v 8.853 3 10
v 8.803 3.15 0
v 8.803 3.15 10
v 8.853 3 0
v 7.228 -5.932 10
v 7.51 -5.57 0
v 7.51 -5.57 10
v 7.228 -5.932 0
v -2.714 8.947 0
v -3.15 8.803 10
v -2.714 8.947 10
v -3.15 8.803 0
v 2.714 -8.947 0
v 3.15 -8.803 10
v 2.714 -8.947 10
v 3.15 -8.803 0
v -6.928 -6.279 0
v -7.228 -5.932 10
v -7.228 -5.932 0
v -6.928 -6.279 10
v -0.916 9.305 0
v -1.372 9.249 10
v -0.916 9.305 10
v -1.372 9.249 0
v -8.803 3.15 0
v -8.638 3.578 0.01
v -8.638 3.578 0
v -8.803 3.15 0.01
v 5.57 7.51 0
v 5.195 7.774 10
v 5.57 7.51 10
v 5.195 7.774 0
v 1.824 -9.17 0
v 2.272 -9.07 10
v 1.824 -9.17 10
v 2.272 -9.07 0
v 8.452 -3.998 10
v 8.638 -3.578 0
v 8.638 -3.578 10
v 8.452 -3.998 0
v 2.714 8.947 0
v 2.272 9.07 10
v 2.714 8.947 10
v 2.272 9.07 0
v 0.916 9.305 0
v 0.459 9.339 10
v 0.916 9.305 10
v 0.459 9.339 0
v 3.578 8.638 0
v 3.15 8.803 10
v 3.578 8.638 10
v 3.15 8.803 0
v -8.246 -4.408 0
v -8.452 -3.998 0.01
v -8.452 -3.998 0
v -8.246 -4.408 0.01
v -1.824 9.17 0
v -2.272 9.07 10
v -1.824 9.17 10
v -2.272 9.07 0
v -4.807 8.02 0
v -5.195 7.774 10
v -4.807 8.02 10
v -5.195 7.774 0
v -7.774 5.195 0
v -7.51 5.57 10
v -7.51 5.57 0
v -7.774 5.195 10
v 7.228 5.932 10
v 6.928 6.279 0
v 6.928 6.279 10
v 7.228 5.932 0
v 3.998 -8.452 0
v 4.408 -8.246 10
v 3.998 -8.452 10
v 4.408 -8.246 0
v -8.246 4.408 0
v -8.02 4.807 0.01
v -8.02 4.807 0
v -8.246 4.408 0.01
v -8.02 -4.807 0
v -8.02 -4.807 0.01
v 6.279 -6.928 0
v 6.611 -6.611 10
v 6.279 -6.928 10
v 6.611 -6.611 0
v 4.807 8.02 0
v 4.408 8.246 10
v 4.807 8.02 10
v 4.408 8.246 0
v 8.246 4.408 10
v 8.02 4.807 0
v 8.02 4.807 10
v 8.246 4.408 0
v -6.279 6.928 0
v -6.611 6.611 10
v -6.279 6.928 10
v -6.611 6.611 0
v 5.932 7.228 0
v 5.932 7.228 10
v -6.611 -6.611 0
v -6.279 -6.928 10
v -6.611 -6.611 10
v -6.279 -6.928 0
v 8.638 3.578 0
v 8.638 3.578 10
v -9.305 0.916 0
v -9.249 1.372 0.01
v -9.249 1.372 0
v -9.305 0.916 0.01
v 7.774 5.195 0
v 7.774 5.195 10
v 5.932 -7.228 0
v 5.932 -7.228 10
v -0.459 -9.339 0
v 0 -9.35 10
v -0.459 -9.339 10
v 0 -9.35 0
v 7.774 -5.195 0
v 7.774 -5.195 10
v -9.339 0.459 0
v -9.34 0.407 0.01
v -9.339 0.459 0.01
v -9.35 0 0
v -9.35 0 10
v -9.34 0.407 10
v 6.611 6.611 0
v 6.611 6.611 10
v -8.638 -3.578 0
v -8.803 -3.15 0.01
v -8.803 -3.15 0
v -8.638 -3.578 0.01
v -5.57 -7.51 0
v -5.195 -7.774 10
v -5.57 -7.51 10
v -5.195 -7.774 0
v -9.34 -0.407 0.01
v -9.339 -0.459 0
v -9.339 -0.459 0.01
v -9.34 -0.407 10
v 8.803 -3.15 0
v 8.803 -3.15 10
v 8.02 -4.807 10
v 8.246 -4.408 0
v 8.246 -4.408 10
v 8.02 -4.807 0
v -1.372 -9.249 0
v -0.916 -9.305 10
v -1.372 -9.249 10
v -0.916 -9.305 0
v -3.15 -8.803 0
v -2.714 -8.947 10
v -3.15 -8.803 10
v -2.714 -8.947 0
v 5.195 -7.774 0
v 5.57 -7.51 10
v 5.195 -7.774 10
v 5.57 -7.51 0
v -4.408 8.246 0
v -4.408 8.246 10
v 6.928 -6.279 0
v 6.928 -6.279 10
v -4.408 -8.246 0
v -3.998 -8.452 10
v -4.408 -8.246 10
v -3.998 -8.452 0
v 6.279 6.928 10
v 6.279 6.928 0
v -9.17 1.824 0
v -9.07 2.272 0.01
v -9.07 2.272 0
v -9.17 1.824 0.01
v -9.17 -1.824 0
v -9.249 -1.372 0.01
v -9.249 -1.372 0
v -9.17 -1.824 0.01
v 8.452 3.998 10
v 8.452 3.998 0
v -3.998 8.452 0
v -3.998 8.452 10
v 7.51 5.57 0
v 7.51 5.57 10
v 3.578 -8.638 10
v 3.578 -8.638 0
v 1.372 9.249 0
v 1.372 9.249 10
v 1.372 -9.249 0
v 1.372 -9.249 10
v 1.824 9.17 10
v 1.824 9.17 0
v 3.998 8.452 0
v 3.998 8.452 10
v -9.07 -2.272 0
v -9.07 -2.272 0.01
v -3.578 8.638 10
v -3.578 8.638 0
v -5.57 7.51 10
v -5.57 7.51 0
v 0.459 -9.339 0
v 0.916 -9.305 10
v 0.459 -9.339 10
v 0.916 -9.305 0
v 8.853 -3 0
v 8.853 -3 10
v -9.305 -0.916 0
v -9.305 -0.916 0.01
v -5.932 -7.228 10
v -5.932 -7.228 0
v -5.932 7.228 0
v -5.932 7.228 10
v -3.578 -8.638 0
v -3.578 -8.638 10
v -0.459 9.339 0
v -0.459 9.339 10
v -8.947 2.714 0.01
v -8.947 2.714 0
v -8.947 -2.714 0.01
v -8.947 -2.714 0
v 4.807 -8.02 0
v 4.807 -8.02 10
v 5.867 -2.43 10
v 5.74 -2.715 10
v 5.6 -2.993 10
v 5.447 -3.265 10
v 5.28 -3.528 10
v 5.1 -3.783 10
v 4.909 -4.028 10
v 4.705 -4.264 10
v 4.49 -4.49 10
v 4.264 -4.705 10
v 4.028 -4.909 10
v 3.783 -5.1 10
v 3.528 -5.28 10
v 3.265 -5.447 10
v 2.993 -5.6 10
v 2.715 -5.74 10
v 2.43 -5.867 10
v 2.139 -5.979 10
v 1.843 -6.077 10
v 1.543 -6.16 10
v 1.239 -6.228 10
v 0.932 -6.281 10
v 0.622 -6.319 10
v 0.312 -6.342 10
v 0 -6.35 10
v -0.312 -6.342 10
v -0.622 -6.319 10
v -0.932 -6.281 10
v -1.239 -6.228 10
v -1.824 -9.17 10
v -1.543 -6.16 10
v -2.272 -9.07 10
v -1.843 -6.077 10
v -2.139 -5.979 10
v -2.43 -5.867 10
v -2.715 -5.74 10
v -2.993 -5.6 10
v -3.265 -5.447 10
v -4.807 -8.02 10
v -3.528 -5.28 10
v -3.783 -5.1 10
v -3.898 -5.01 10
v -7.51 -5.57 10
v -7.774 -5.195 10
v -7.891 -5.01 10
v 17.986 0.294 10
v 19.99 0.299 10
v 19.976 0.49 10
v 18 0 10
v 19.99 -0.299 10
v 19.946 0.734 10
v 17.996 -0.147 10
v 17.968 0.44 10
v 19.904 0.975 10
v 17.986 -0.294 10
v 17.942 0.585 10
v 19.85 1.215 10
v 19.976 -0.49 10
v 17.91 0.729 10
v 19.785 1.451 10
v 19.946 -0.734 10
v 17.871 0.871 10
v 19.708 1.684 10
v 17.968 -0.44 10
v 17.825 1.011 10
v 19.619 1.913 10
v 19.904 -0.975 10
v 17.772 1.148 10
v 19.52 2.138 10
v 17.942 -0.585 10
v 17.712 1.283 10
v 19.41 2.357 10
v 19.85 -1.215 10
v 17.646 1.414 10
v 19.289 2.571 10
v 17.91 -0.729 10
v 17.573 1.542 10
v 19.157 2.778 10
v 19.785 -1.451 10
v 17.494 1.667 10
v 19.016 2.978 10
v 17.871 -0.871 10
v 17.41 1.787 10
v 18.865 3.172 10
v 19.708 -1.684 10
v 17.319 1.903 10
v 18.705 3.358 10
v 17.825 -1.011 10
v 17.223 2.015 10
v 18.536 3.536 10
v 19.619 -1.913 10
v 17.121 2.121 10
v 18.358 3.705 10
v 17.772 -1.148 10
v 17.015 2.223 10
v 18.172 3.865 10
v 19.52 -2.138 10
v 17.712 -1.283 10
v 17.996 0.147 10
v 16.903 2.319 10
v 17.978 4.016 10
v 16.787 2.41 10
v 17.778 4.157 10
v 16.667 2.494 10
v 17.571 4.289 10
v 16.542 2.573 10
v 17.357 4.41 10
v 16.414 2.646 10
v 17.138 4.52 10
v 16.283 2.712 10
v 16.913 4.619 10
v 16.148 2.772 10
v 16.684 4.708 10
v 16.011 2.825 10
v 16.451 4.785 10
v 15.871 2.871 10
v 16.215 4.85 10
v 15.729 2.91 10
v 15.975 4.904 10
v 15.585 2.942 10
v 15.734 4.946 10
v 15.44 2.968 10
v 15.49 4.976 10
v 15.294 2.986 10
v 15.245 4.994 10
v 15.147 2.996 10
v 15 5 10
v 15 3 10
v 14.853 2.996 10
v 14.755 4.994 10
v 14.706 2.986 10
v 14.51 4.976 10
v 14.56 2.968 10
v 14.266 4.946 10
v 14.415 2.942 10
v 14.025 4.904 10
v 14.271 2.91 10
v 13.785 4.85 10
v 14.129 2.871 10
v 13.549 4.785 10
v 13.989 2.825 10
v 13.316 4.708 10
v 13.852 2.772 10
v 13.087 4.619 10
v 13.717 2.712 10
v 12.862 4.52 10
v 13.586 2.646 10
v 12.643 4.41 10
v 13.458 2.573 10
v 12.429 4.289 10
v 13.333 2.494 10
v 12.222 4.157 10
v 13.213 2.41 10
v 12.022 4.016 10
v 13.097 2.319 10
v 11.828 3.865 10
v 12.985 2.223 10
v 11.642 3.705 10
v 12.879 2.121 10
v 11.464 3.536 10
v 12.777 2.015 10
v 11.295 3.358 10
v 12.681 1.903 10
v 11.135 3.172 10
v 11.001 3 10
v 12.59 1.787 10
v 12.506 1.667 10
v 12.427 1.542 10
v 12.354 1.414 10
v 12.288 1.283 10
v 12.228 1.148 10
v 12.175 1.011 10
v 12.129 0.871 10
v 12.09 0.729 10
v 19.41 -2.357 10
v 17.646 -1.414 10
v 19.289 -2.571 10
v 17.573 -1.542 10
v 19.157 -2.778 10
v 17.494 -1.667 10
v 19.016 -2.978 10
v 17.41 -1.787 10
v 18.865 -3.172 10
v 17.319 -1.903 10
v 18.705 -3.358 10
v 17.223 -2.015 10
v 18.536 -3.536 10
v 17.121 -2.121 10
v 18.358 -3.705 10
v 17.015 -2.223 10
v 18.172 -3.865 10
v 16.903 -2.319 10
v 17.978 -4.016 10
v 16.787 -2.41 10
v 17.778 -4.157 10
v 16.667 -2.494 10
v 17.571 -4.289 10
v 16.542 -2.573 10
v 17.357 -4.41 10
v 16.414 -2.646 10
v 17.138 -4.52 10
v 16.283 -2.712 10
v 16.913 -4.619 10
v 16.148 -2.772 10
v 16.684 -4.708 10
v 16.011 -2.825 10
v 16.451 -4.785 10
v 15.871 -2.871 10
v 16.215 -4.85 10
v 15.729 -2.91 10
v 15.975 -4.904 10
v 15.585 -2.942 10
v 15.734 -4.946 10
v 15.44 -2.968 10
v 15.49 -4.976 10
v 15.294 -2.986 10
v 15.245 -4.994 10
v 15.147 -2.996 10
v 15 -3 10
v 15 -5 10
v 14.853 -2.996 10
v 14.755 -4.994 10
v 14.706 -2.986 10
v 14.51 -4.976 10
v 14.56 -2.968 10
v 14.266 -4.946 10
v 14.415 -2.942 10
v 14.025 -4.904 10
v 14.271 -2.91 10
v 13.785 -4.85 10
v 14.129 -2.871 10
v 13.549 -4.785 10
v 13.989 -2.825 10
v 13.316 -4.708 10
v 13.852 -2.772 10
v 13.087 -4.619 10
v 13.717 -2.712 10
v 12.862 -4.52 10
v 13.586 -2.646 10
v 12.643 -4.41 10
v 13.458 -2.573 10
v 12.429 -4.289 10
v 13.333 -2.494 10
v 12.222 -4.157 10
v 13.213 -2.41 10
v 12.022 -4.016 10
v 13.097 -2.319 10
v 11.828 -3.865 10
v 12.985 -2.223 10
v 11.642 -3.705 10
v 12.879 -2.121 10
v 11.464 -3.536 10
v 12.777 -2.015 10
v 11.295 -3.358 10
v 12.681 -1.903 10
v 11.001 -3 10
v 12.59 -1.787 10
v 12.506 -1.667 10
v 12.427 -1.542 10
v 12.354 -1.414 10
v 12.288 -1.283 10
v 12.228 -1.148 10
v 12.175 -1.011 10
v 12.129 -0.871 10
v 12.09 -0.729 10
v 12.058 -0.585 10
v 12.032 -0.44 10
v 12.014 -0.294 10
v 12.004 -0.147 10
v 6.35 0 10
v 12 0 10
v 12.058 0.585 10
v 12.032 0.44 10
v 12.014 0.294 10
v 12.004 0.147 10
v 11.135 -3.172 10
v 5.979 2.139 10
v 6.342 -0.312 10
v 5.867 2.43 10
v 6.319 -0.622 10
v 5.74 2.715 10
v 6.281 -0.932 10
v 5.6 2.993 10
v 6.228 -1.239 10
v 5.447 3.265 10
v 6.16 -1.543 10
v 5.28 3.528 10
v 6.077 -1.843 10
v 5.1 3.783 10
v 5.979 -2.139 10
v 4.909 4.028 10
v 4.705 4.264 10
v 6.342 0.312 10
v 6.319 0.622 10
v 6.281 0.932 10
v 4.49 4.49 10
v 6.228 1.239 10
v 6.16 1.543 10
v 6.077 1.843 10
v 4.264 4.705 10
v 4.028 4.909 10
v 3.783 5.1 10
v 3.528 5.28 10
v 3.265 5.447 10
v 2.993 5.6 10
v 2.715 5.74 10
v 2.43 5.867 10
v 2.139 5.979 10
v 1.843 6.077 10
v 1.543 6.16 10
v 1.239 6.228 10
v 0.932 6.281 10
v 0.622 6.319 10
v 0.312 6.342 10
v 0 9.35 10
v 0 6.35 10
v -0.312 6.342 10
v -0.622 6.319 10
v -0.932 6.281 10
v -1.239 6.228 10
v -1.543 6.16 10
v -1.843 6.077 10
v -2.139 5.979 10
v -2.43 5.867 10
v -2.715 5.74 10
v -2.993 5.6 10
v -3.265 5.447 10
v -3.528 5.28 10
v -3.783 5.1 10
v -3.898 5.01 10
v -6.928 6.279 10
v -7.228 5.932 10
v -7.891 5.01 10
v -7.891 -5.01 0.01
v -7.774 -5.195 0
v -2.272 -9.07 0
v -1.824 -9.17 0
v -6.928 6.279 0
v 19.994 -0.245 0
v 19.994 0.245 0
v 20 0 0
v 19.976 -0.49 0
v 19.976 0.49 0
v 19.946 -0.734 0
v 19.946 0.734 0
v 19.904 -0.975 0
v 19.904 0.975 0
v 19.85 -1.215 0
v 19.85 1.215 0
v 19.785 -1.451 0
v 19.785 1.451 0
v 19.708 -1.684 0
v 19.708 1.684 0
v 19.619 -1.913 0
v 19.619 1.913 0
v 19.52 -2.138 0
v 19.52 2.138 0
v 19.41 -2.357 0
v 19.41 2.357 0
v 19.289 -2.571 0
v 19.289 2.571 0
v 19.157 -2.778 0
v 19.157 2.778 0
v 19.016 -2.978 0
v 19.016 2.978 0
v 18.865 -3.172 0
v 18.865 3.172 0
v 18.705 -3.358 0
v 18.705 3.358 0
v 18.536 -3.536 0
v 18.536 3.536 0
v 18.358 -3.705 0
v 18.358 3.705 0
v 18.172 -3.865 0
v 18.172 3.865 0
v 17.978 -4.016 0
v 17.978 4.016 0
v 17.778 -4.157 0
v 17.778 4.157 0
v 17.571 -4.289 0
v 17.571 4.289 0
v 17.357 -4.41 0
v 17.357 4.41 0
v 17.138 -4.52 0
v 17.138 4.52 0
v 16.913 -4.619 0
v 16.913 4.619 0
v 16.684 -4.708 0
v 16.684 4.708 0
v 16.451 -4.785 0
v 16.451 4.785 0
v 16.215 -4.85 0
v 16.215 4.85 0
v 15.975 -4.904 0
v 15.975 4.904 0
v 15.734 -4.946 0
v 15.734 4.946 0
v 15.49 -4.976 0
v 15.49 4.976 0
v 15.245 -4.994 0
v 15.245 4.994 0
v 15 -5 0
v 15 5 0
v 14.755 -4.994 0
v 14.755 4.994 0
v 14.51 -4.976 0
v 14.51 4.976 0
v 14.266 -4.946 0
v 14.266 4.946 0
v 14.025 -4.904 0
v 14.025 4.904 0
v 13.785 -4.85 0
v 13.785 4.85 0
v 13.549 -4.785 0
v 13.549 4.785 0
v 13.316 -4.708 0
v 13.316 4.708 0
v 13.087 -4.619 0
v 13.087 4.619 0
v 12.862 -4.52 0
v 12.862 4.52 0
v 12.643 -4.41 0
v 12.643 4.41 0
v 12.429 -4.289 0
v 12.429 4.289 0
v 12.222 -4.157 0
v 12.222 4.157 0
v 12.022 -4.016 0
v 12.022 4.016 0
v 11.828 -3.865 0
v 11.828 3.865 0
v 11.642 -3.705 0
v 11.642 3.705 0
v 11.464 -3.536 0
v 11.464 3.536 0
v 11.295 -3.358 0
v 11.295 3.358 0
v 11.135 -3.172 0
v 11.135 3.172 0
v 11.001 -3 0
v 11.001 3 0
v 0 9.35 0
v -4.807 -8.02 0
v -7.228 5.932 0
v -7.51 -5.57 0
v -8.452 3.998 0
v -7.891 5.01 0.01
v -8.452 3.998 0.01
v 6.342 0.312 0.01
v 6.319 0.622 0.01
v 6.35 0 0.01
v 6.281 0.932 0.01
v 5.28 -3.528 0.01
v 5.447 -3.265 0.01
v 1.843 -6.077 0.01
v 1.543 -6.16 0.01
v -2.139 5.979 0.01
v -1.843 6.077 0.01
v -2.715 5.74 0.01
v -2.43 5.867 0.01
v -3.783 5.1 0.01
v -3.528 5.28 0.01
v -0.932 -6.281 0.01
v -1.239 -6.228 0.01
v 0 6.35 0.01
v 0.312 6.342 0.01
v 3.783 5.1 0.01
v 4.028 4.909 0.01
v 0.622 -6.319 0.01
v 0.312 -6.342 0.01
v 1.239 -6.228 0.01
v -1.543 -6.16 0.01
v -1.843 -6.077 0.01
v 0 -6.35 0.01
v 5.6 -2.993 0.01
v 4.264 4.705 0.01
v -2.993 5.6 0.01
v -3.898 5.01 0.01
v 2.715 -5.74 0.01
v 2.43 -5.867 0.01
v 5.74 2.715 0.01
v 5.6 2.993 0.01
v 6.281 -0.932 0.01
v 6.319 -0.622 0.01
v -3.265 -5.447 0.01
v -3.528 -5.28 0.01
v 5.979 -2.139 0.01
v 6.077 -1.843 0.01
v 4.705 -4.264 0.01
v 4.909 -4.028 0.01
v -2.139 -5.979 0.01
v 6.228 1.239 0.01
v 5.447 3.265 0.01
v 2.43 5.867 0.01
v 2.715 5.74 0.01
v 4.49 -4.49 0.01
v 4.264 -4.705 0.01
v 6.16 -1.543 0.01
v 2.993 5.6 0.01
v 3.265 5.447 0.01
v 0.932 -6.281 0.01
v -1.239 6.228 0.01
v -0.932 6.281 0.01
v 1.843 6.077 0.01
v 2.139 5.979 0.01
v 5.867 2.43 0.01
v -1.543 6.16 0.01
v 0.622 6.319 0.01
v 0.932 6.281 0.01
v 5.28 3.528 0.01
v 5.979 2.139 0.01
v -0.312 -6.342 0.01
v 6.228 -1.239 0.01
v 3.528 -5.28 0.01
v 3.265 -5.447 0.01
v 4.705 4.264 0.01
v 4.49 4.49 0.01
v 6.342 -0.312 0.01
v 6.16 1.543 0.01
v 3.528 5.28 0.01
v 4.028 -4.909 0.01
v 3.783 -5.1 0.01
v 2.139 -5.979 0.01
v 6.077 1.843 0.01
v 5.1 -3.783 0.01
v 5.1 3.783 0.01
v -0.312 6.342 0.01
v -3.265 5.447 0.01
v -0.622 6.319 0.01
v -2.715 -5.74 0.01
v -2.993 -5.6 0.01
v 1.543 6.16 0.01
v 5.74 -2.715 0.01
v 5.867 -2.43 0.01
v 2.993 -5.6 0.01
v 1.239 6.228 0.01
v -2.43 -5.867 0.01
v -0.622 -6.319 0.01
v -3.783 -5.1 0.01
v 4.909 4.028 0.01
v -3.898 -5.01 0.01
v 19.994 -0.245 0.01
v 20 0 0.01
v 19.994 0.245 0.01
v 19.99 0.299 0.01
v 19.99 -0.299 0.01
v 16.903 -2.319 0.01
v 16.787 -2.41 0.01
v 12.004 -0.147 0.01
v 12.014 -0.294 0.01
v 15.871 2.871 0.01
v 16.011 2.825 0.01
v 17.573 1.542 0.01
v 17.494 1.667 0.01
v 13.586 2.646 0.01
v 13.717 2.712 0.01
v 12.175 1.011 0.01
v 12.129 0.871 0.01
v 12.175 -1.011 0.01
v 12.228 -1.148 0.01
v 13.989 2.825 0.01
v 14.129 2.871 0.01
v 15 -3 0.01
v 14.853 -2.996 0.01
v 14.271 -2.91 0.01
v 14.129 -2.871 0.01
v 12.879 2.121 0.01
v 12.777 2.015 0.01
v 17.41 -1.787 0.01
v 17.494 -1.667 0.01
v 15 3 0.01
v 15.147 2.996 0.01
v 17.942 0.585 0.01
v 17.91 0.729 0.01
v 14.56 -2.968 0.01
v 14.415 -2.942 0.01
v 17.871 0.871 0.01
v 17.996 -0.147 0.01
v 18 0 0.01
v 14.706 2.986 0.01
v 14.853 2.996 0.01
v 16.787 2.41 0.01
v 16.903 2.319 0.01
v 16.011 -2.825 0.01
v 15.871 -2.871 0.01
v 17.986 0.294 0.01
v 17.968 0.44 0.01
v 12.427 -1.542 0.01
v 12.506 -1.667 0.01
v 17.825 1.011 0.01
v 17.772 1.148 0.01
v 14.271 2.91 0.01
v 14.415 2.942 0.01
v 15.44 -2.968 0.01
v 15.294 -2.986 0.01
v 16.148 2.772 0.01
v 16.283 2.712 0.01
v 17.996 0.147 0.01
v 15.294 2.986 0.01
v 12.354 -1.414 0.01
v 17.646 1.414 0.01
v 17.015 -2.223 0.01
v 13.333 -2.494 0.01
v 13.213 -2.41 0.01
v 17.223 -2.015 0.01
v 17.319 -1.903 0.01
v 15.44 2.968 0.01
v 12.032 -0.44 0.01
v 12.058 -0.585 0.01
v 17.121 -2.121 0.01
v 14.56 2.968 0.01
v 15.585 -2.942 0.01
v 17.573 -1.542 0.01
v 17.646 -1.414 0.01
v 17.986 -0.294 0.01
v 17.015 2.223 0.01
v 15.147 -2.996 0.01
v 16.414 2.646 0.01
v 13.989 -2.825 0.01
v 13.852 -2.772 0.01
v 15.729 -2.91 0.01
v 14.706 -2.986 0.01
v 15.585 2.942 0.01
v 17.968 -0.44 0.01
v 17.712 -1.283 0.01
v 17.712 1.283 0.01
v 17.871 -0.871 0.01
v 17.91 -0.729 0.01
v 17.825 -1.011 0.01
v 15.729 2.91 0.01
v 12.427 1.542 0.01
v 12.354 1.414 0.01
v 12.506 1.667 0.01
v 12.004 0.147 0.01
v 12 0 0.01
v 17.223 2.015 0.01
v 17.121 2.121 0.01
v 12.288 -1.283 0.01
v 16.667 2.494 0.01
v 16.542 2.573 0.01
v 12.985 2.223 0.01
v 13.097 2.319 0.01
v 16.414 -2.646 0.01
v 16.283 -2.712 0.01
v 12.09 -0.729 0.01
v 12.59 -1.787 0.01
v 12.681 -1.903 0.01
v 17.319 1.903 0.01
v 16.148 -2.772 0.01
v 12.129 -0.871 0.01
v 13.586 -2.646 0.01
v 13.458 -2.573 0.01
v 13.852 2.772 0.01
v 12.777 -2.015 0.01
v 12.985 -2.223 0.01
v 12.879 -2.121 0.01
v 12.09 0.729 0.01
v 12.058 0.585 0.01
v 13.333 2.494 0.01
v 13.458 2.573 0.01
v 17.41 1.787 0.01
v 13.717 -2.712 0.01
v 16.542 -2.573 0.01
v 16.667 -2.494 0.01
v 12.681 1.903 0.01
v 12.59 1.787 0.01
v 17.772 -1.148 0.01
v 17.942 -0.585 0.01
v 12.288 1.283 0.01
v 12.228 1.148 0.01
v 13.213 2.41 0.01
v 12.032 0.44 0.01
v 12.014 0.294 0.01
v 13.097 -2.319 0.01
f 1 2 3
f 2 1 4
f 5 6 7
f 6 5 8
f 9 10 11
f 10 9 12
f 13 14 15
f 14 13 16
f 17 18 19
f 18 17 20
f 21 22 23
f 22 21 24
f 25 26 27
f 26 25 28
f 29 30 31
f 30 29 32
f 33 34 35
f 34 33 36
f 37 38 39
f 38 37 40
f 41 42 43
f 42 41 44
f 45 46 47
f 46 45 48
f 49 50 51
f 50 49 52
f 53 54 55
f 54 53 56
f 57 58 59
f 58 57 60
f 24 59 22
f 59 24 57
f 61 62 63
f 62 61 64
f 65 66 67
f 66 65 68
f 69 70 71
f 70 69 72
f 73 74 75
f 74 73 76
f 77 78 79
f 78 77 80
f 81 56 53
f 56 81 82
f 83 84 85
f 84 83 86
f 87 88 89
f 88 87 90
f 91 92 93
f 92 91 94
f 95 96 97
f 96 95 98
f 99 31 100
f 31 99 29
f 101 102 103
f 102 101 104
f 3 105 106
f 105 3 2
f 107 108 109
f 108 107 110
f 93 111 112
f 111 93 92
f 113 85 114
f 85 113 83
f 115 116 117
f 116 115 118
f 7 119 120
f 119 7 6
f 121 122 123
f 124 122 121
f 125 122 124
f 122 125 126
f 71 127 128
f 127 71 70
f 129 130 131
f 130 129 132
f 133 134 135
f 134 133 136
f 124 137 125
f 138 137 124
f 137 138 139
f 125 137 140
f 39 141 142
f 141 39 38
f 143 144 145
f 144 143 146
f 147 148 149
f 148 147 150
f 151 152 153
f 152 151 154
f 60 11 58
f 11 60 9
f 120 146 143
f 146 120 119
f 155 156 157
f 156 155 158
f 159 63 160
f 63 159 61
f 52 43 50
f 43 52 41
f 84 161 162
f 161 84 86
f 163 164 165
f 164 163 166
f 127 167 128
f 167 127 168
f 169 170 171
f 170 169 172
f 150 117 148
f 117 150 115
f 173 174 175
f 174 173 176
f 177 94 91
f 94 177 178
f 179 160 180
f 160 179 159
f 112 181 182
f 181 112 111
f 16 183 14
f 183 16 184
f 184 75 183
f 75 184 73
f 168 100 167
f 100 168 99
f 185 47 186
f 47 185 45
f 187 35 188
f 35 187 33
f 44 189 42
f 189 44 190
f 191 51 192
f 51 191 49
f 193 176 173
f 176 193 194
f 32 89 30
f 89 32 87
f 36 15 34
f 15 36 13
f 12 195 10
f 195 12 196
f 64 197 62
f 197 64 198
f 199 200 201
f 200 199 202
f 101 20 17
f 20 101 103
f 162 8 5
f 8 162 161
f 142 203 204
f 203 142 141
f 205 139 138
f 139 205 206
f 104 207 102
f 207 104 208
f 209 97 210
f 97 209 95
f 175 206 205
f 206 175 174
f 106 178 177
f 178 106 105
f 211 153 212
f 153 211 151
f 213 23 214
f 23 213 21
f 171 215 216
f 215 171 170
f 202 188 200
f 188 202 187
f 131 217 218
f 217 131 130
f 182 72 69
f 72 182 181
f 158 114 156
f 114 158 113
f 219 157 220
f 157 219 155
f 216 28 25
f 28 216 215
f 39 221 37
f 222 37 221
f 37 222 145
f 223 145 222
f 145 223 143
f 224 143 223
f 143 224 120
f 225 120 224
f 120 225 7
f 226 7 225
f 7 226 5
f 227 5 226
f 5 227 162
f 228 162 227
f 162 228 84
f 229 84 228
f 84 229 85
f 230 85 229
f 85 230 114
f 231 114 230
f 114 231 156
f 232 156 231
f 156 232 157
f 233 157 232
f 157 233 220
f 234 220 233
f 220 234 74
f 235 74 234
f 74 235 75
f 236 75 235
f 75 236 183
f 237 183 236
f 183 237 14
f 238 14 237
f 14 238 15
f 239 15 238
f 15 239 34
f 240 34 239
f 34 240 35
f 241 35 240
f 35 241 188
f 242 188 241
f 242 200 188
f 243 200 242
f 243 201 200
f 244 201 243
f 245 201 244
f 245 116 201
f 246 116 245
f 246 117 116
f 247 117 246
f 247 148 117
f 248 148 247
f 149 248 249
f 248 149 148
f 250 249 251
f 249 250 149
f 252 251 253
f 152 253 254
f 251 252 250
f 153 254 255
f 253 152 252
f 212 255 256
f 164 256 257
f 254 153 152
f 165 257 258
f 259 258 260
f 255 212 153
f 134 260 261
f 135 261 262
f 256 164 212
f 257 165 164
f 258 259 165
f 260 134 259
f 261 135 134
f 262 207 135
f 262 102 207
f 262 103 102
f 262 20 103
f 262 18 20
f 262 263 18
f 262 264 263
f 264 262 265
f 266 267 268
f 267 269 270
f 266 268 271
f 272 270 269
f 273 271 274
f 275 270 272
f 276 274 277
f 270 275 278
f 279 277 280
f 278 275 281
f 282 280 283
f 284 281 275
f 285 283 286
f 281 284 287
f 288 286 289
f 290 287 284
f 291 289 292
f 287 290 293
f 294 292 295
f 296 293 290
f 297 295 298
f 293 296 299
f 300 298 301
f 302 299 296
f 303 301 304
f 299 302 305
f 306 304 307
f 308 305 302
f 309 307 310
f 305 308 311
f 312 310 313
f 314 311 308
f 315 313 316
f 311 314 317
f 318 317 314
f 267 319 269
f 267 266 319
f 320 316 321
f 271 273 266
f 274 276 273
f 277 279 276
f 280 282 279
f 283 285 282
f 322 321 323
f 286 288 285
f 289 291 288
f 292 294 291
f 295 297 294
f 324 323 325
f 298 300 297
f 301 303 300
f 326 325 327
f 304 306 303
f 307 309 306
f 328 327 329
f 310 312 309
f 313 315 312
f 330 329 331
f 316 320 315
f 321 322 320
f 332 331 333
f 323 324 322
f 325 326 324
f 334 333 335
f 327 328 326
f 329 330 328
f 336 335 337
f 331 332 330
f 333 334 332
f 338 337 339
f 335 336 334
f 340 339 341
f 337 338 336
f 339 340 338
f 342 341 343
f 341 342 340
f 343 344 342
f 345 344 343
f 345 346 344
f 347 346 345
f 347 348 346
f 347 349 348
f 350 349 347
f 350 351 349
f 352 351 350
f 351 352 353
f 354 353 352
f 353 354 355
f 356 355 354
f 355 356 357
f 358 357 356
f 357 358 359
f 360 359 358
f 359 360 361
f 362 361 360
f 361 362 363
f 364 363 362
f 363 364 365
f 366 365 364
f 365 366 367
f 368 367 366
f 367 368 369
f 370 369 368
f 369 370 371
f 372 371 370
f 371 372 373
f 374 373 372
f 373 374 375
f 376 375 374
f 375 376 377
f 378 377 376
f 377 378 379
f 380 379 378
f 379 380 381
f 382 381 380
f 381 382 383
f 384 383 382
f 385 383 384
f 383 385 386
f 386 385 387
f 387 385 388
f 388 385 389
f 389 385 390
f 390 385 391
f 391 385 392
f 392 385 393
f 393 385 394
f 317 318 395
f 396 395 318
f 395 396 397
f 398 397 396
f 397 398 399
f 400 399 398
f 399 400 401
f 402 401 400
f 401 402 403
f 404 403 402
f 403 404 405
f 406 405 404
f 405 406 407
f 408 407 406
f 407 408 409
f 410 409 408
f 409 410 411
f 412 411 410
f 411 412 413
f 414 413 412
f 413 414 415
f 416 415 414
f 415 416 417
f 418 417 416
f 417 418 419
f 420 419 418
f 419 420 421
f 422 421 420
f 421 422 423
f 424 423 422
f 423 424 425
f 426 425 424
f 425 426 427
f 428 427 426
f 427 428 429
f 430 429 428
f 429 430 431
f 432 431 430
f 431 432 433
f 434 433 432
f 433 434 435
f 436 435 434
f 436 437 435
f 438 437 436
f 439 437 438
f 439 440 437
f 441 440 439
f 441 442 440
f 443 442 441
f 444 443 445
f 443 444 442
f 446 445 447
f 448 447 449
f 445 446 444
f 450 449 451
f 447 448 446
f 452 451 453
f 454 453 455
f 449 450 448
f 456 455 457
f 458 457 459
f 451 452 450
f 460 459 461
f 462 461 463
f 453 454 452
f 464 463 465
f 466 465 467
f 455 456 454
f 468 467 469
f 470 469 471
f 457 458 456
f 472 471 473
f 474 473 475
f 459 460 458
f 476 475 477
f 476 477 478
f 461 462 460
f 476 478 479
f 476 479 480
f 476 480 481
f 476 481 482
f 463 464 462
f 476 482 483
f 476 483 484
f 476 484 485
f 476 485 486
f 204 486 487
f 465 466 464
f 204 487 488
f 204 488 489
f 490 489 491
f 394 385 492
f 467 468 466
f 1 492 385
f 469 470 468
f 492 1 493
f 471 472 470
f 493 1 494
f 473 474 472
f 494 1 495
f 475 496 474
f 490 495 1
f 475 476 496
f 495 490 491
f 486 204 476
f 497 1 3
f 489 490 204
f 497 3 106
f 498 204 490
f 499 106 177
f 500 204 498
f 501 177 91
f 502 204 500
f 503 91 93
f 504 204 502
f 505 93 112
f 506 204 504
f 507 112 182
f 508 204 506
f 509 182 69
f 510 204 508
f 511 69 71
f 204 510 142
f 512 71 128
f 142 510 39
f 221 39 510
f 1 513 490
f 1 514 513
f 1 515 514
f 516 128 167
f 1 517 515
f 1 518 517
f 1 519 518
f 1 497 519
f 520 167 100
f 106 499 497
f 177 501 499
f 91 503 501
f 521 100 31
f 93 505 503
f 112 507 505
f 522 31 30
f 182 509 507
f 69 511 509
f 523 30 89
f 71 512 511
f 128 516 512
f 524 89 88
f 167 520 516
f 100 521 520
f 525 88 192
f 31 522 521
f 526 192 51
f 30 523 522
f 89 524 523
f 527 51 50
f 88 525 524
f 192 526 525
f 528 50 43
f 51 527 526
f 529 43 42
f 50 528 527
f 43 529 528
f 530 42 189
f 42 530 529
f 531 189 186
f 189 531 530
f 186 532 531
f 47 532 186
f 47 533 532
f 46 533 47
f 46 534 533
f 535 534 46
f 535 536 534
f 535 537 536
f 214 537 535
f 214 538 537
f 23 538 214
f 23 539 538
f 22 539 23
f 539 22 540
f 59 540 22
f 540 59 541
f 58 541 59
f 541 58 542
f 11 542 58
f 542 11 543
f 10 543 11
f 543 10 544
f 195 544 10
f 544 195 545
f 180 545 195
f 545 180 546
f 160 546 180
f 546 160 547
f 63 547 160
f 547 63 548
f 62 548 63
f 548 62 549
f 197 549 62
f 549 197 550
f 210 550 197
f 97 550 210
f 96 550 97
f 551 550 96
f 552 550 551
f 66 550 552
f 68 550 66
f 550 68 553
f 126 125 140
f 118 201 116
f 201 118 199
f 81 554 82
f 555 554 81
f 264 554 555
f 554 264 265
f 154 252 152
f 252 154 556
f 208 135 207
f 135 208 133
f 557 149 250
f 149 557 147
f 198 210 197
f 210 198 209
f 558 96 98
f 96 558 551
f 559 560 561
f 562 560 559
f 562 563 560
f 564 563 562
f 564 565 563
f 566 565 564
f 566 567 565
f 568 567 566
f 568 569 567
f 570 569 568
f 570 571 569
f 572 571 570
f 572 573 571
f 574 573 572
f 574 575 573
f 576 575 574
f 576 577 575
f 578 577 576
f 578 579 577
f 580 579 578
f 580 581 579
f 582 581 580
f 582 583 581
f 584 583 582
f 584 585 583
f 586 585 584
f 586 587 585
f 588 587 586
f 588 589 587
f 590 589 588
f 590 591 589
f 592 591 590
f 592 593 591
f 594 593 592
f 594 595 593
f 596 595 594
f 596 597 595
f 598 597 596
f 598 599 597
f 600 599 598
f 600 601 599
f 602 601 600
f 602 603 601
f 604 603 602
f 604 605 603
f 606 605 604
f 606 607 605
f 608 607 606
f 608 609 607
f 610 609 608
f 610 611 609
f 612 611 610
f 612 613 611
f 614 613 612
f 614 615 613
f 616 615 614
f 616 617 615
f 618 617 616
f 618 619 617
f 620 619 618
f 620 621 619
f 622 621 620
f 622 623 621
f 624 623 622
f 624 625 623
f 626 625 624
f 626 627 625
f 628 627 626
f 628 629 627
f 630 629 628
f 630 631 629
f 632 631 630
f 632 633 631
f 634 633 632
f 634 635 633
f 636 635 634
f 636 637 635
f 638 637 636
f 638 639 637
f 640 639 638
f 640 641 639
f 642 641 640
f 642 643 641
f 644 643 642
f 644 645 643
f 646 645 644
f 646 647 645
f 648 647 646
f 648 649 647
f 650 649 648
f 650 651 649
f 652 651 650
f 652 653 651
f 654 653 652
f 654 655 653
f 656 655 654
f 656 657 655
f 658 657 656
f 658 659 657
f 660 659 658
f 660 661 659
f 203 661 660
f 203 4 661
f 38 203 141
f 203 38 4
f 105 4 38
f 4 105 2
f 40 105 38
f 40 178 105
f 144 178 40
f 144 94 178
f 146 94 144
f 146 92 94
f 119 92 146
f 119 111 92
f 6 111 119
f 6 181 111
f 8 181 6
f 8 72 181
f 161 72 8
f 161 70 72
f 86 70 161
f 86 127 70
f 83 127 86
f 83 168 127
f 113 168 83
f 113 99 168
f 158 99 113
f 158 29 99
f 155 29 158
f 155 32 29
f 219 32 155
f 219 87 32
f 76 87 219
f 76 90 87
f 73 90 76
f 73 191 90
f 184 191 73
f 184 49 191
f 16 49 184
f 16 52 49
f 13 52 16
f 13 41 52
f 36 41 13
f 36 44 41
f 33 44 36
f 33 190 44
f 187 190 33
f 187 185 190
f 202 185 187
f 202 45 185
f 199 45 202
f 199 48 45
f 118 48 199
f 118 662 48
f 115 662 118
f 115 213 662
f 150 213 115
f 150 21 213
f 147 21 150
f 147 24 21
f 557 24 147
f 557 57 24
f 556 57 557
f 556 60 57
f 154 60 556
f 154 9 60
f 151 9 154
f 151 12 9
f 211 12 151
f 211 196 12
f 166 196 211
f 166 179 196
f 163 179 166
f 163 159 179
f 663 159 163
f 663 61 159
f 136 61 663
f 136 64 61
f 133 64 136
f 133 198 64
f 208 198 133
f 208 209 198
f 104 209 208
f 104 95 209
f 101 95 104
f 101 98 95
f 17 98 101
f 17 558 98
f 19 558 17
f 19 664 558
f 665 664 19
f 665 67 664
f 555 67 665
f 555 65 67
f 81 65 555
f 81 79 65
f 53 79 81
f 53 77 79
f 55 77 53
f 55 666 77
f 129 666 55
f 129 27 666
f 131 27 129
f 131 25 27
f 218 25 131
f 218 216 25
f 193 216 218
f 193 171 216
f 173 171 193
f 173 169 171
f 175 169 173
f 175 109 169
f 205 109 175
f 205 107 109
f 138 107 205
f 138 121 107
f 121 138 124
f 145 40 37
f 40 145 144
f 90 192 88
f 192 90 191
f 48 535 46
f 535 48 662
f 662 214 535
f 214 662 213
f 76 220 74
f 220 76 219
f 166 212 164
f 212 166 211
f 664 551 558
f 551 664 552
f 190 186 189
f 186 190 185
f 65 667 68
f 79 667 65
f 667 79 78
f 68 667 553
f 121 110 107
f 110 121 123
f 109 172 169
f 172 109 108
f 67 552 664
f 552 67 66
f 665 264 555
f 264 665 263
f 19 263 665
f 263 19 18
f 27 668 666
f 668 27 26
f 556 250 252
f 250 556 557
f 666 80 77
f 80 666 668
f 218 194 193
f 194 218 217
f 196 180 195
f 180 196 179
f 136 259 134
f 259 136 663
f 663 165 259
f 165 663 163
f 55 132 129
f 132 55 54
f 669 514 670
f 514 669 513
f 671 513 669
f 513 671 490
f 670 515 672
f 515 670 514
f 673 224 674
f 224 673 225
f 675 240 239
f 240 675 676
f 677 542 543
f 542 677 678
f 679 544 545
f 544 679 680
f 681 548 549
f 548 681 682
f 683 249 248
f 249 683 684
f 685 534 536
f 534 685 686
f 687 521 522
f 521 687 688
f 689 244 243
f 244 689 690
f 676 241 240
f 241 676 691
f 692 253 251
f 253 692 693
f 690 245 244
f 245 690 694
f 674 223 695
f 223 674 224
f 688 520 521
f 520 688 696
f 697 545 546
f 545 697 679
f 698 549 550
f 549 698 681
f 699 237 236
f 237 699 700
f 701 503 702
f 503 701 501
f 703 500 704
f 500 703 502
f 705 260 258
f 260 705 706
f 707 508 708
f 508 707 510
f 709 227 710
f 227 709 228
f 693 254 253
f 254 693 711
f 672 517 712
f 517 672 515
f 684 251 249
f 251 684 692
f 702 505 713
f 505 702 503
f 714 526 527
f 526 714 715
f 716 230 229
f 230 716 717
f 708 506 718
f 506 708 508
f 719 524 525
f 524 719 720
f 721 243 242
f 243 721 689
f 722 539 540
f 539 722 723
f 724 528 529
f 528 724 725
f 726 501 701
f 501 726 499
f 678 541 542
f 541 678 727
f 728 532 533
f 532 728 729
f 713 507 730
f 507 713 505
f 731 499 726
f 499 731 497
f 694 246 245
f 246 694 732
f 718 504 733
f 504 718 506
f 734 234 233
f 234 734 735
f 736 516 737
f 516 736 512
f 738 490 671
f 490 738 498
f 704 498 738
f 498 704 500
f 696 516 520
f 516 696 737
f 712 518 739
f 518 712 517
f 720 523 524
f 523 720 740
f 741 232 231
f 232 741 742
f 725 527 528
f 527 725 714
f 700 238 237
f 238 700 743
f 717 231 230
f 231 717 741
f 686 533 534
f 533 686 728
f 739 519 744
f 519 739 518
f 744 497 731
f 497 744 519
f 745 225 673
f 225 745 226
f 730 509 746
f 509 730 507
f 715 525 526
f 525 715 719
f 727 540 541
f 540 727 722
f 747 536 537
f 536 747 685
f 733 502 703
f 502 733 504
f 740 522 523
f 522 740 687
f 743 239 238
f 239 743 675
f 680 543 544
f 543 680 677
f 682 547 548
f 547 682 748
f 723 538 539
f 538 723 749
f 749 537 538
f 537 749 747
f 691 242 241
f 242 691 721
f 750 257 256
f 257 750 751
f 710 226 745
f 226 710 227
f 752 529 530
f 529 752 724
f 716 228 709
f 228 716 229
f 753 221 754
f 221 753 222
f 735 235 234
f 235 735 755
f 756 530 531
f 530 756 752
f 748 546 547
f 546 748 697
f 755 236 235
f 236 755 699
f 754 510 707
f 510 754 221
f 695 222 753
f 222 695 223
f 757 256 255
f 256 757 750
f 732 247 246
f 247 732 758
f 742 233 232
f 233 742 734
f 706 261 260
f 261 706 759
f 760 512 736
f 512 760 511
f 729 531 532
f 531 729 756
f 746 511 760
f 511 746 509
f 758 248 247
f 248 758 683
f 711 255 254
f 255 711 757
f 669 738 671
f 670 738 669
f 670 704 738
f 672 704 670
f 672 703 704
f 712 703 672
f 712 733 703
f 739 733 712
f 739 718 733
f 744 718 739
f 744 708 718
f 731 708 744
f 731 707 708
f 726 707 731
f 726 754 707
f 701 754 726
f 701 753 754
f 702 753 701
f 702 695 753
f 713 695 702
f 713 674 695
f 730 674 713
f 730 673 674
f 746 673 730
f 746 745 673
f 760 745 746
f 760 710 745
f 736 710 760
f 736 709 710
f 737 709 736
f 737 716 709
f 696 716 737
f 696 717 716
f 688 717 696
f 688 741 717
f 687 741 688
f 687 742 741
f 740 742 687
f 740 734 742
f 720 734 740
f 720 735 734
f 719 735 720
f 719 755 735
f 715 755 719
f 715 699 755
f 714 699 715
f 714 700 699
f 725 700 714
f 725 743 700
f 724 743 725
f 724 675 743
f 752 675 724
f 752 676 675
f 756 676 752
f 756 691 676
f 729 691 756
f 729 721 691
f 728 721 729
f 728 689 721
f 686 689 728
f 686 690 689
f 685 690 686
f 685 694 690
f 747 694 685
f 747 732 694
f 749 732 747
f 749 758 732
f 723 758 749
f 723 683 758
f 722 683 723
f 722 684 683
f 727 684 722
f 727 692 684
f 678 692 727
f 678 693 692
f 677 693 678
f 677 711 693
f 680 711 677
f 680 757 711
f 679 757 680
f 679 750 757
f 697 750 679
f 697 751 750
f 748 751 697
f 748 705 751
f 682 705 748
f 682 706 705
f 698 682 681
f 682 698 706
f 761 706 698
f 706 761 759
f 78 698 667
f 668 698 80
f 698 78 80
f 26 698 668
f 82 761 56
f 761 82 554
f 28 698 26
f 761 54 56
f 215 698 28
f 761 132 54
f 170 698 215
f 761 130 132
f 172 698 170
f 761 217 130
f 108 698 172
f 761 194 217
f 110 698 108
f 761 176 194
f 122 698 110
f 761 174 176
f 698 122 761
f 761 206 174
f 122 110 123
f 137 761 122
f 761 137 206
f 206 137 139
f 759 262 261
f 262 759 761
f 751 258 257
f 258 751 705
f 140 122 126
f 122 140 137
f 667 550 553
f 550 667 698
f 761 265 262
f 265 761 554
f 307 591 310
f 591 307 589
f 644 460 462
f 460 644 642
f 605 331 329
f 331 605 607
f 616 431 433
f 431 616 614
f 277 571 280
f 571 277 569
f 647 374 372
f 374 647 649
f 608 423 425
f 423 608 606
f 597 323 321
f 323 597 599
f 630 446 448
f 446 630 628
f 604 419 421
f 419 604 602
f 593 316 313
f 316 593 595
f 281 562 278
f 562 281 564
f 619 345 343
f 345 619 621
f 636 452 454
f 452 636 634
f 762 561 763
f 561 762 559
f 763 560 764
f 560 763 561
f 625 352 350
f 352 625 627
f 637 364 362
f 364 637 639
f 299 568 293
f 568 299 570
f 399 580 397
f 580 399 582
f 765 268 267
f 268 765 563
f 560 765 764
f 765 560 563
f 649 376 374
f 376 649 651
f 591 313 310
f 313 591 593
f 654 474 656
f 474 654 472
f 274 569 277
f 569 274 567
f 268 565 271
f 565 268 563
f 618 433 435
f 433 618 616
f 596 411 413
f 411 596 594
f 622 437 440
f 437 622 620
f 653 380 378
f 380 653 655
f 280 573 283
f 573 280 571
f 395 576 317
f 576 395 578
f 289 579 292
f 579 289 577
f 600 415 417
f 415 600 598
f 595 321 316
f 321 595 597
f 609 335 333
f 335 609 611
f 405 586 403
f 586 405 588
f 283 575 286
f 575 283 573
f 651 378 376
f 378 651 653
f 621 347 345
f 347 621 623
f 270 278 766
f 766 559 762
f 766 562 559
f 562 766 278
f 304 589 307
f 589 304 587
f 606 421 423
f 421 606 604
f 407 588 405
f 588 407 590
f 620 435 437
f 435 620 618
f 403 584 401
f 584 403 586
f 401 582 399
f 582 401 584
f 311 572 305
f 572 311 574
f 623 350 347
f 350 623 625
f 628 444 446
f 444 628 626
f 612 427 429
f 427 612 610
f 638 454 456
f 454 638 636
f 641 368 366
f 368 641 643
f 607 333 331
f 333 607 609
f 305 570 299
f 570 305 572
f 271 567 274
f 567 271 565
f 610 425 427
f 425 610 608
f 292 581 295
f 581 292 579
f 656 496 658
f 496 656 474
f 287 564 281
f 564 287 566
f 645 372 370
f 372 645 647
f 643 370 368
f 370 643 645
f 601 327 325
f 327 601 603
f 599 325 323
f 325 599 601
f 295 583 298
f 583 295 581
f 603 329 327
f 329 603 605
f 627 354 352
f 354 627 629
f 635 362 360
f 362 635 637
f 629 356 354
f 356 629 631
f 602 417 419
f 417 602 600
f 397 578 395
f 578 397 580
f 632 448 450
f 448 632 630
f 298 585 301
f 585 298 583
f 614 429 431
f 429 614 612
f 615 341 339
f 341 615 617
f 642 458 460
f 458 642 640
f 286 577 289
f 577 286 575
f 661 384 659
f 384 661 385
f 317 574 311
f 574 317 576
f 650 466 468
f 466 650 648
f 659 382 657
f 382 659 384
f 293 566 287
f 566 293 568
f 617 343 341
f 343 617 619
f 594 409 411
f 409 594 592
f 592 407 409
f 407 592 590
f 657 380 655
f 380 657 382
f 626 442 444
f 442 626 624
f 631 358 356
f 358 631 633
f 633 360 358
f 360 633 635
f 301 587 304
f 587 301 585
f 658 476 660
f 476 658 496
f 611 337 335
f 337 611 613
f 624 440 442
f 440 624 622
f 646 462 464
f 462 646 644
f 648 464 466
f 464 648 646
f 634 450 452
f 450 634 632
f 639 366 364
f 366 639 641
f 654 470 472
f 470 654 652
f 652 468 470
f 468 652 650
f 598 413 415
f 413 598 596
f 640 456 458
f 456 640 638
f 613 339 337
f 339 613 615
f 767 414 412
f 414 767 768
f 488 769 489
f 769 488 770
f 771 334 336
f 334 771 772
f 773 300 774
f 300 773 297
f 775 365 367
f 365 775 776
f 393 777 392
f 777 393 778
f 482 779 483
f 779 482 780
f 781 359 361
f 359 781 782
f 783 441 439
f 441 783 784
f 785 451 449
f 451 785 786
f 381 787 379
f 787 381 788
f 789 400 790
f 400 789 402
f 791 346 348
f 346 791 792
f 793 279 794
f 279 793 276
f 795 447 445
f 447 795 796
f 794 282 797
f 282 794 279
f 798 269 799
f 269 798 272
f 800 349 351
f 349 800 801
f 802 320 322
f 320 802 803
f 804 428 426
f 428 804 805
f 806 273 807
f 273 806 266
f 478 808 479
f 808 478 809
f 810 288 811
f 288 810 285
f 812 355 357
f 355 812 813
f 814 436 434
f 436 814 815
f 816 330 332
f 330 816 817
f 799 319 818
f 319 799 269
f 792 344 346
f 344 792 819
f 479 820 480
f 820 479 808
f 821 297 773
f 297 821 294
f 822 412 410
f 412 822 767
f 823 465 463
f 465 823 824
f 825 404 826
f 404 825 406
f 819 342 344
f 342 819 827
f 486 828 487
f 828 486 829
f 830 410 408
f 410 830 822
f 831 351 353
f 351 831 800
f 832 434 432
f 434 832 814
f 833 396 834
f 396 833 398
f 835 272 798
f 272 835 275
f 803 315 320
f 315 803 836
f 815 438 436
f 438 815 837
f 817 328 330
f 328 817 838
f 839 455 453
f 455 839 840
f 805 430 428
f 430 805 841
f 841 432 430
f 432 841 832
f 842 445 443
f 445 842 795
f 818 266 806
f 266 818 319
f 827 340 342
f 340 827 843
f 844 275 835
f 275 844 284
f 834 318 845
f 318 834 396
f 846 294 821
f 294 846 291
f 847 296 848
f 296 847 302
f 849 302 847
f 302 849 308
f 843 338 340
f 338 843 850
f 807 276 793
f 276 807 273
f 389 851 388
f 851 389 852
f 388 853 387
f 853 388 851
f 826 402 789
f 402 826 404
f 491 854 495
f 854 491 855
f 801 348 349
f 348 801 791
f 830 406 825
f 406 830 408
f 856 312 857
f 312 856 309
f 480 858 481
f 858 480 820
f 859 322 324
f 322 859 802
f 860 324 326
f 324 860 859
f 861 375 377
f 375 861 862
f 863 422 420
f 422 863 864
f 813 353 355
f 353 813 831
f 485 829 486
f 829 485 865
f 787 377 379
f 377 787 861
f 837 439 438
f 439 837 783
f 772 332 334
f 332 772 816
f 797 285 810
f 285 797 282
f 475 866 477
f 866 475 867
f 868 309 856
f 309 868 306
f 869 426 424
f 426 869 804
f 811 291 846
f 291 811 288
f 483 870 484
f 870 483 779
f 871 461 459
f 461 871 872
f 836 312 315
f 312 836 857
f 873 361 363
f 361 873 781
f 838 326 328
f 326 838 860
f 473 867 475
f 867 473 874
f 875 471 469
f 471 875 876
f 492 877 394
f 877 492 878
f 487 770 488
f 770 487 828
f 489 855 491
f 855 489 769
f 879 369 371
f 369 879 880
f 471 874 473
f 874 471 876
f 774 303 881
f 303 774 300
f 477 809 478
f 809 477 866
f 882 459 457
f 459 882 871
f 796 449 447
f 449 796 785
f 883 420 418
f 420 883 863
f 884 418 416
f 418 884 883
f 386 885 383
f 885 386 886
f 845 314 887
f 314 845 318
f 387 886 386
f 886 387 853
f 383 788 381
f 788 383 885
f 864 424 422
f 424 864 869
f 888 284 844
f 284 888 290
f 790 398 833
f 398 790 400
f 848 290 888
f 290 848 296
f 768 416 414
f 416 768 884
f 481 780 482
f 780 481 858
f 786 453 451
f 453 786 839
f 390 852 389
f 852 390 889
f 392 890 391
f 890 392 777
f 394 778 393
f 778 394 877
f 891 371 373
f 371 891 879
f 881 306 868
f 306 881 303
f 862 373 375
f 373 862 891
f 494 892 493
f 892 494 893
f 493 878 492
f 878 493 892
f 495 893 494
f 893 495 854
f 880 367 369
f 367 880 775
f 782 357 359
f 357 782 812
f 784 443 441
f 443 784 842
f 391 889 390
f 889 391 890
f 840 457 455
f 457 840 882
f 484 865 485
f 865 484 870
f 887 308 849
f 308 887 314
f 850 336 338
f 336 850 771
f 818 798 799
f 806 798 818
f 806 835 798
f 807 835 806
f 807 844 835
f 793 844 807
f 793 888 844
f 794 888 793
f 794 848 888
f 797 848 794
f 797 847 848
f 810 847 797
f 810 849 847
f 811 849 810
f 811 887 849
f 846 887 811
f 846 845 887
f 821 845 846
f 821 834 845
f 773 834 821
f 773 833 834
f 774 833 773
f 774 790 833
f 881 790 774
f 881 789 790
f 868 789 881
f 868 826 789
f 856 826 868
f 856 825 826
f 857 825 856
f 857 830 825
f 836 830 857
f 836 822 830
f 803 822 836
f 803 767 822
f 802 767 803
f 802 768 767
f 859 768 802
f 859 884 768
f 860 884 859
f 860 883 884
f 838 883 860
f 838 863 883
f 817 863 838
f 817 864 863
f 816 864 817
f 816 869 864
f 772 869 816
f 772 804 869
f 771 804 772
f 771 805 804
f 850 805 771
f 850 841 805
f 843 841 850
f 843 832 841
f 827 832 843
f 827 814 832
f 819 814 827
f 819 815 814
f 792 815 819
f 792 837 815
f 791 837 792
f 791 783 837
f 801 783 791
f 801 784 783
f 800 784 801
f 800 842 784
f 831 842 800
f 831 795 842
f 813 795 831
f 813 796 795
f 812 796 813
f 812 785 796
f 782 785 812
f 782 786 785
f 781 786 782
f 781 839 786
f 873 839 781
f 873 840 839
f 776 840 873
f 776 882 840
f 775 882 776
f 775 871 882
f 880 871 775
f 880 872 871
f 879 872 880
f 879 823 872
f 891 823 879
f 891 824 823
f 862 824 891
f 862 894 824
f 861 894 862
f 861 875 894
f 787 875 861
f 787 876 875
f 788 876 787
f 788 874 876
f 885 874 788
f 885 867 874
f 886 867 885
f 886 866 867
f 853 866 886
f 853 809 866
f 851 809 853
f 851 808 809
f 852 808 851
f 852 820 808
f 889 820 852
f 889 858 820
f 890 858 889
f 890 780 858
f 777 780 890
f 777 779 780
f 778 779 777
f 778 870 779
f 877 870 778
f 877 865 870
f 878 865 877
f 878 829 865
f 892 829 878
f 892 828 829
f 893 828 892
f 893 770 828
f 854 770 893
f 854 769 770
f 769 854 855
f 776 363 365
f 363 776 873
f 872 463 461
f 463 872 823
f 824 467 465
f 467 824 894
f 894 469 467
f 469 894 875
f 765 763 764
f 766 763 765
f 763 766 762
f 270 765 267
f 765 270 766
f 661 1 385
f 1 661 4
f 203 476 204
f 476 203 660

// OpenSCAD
// Snap-on Clip for Lab Stand Rod and Tubing
// Orientation: Flat on XY plane, building up in +Z.
// Units: Millimetres.

// --- Dimensions ---
// Rod Stand Dimensions
$rod_diameter = 12.7;
$rod_wall_thickness = 3;
$rod_outer_diameter = $rod_diameter + 2 * $rod_wall_thickness; // 18.7
$rod_ring_height = 10;

// Tubing Dimensions
$tubing_diameter = 6;
$tubing_wall_thickness = 2;
$tubing_outer_diameter = $tubing_diameter + 2 * $tubing_wall_thickness; // 8
$tubing_ring_height = 10;

// Positioning
$rod_center_x = 0;
$rod_center_y = 0;
$tubing_center_x = 15;
$tubing_center_y = 0;

// Bridge Dimensions
$bridge_width_x = 4; // From x=8 to x=12
$bridge_width_y = 6;
$bridge_height = 10;

// Cutout Dimensions
$rod_cutout_width = 10;
$rod_cutout_height = 10; // -5 to 5
$rod_cutout_offset_x = -($rod_outer_diameter / 2) + ($rod_cutout_width / 2); // Start of cutout relative to center

$tubing_cutout_width = 4.5;
$tubing_cutout_height = 4.5; // -2.25 to 2.25
$tubing_cutout_offset_x = ($tubing_outer_diameter / 2) - ($tubing_cutout_width / 2); // End of cutout relative to center

// --- Configuration ---
$fn = 128; // High resolution for smooth curves

module rod_ring() {
    // Main Ring
    difference() {
        // Extrude the full outer circle
        translate([0, 0, 0])
            cylinder(h = $rod_ring_height, d = $rod_outer_diameter, $fn = $fn);
        
        // Inner Hole
        translate([0, 0, 0.01])
            cylinder(h = $rod_ring_height + 0.02, d = $rod_diameter, $fn = $fn);
        
        // Cutout on -X side
        // We need to cut a rectangular slot from the outer edge inwards.
        // The cutout is defined as x < 0 and -5 < y < 5 relative to the ring center.
        // However, the ring is a torus-like shape. We cut a box that intersects the ring.
        // The box should extend slightly past the outer face to ensure clean cut.
        
        translate([
            -$rod_outer_diameter / 2 + 0.01, // Start just inside the outer edge
            -$rod_cutout_height / 2 - 0.01,  // Start just below y = -5
            0.01
        ])
            cube([
                $rod_cutout_width + 0.02, // Width + clearance
                $rod_cutout_height + 0.02, // Height + clearance
                $rod_ring_height + 0.02
            ]);
    }
}

module tubing_ring() {
    // Main Ring
    difference() {
        // Extrude the full outer circle
        translate([0, 0, 0])
            cylinder(h = $tubing_ring_height, d = $tubing_outer_diameter, $fn = $fn);
        
        // Inner Hole
        translate([0, 0, 0.01])
            cylinder(h = $tubing_ring_height + 0.02, d = $tubing_diameter, $fn = $fn);
        
        // Cutout on +X side
        // Defined as x > 15 and -2.25 < y < 2.25 relative to global origin.
        // Relative to tubing center (15, 0), this is x_local > 0 and -2.25 < y < 2.25.
        // We cut a box starting from the outer edge inwards.
        
        translate([
            $tubing_outer_diameter / 2 - 0.01, // Start just inside the outer edge
            -$tubing_cutout_height / 2 - 0.01, // Start just below y = -2.25
            0.01
        ])
            cube([
                $tubing_cutout_width + 0.02, // Width + clearance
                $tubing_cutout_height + 0.02, // Height + clearance
                $tubing_ring_height + 0.02
            ]);
    }
}

module bridge() {
    // Solid bridge between x=8 and x=12
    // Width in Y is 6mm.
    // Height is 10mm.
    translate([8, -3, 0])
        cube([4, 6, 10]);
}

// --- Main Assembly ---
difference() {
    union() {
        // 1. Rod Ring
        translate([$rod_center_x, $rod_center_y, 0])
            rod_ring();
        
        // 2. Tubing Ring
        translate([$tubing_center_x, $tubing_center_y, 0])
            tubing_ring();
        
        // 3. Bridge
        bridge();
    }
}
